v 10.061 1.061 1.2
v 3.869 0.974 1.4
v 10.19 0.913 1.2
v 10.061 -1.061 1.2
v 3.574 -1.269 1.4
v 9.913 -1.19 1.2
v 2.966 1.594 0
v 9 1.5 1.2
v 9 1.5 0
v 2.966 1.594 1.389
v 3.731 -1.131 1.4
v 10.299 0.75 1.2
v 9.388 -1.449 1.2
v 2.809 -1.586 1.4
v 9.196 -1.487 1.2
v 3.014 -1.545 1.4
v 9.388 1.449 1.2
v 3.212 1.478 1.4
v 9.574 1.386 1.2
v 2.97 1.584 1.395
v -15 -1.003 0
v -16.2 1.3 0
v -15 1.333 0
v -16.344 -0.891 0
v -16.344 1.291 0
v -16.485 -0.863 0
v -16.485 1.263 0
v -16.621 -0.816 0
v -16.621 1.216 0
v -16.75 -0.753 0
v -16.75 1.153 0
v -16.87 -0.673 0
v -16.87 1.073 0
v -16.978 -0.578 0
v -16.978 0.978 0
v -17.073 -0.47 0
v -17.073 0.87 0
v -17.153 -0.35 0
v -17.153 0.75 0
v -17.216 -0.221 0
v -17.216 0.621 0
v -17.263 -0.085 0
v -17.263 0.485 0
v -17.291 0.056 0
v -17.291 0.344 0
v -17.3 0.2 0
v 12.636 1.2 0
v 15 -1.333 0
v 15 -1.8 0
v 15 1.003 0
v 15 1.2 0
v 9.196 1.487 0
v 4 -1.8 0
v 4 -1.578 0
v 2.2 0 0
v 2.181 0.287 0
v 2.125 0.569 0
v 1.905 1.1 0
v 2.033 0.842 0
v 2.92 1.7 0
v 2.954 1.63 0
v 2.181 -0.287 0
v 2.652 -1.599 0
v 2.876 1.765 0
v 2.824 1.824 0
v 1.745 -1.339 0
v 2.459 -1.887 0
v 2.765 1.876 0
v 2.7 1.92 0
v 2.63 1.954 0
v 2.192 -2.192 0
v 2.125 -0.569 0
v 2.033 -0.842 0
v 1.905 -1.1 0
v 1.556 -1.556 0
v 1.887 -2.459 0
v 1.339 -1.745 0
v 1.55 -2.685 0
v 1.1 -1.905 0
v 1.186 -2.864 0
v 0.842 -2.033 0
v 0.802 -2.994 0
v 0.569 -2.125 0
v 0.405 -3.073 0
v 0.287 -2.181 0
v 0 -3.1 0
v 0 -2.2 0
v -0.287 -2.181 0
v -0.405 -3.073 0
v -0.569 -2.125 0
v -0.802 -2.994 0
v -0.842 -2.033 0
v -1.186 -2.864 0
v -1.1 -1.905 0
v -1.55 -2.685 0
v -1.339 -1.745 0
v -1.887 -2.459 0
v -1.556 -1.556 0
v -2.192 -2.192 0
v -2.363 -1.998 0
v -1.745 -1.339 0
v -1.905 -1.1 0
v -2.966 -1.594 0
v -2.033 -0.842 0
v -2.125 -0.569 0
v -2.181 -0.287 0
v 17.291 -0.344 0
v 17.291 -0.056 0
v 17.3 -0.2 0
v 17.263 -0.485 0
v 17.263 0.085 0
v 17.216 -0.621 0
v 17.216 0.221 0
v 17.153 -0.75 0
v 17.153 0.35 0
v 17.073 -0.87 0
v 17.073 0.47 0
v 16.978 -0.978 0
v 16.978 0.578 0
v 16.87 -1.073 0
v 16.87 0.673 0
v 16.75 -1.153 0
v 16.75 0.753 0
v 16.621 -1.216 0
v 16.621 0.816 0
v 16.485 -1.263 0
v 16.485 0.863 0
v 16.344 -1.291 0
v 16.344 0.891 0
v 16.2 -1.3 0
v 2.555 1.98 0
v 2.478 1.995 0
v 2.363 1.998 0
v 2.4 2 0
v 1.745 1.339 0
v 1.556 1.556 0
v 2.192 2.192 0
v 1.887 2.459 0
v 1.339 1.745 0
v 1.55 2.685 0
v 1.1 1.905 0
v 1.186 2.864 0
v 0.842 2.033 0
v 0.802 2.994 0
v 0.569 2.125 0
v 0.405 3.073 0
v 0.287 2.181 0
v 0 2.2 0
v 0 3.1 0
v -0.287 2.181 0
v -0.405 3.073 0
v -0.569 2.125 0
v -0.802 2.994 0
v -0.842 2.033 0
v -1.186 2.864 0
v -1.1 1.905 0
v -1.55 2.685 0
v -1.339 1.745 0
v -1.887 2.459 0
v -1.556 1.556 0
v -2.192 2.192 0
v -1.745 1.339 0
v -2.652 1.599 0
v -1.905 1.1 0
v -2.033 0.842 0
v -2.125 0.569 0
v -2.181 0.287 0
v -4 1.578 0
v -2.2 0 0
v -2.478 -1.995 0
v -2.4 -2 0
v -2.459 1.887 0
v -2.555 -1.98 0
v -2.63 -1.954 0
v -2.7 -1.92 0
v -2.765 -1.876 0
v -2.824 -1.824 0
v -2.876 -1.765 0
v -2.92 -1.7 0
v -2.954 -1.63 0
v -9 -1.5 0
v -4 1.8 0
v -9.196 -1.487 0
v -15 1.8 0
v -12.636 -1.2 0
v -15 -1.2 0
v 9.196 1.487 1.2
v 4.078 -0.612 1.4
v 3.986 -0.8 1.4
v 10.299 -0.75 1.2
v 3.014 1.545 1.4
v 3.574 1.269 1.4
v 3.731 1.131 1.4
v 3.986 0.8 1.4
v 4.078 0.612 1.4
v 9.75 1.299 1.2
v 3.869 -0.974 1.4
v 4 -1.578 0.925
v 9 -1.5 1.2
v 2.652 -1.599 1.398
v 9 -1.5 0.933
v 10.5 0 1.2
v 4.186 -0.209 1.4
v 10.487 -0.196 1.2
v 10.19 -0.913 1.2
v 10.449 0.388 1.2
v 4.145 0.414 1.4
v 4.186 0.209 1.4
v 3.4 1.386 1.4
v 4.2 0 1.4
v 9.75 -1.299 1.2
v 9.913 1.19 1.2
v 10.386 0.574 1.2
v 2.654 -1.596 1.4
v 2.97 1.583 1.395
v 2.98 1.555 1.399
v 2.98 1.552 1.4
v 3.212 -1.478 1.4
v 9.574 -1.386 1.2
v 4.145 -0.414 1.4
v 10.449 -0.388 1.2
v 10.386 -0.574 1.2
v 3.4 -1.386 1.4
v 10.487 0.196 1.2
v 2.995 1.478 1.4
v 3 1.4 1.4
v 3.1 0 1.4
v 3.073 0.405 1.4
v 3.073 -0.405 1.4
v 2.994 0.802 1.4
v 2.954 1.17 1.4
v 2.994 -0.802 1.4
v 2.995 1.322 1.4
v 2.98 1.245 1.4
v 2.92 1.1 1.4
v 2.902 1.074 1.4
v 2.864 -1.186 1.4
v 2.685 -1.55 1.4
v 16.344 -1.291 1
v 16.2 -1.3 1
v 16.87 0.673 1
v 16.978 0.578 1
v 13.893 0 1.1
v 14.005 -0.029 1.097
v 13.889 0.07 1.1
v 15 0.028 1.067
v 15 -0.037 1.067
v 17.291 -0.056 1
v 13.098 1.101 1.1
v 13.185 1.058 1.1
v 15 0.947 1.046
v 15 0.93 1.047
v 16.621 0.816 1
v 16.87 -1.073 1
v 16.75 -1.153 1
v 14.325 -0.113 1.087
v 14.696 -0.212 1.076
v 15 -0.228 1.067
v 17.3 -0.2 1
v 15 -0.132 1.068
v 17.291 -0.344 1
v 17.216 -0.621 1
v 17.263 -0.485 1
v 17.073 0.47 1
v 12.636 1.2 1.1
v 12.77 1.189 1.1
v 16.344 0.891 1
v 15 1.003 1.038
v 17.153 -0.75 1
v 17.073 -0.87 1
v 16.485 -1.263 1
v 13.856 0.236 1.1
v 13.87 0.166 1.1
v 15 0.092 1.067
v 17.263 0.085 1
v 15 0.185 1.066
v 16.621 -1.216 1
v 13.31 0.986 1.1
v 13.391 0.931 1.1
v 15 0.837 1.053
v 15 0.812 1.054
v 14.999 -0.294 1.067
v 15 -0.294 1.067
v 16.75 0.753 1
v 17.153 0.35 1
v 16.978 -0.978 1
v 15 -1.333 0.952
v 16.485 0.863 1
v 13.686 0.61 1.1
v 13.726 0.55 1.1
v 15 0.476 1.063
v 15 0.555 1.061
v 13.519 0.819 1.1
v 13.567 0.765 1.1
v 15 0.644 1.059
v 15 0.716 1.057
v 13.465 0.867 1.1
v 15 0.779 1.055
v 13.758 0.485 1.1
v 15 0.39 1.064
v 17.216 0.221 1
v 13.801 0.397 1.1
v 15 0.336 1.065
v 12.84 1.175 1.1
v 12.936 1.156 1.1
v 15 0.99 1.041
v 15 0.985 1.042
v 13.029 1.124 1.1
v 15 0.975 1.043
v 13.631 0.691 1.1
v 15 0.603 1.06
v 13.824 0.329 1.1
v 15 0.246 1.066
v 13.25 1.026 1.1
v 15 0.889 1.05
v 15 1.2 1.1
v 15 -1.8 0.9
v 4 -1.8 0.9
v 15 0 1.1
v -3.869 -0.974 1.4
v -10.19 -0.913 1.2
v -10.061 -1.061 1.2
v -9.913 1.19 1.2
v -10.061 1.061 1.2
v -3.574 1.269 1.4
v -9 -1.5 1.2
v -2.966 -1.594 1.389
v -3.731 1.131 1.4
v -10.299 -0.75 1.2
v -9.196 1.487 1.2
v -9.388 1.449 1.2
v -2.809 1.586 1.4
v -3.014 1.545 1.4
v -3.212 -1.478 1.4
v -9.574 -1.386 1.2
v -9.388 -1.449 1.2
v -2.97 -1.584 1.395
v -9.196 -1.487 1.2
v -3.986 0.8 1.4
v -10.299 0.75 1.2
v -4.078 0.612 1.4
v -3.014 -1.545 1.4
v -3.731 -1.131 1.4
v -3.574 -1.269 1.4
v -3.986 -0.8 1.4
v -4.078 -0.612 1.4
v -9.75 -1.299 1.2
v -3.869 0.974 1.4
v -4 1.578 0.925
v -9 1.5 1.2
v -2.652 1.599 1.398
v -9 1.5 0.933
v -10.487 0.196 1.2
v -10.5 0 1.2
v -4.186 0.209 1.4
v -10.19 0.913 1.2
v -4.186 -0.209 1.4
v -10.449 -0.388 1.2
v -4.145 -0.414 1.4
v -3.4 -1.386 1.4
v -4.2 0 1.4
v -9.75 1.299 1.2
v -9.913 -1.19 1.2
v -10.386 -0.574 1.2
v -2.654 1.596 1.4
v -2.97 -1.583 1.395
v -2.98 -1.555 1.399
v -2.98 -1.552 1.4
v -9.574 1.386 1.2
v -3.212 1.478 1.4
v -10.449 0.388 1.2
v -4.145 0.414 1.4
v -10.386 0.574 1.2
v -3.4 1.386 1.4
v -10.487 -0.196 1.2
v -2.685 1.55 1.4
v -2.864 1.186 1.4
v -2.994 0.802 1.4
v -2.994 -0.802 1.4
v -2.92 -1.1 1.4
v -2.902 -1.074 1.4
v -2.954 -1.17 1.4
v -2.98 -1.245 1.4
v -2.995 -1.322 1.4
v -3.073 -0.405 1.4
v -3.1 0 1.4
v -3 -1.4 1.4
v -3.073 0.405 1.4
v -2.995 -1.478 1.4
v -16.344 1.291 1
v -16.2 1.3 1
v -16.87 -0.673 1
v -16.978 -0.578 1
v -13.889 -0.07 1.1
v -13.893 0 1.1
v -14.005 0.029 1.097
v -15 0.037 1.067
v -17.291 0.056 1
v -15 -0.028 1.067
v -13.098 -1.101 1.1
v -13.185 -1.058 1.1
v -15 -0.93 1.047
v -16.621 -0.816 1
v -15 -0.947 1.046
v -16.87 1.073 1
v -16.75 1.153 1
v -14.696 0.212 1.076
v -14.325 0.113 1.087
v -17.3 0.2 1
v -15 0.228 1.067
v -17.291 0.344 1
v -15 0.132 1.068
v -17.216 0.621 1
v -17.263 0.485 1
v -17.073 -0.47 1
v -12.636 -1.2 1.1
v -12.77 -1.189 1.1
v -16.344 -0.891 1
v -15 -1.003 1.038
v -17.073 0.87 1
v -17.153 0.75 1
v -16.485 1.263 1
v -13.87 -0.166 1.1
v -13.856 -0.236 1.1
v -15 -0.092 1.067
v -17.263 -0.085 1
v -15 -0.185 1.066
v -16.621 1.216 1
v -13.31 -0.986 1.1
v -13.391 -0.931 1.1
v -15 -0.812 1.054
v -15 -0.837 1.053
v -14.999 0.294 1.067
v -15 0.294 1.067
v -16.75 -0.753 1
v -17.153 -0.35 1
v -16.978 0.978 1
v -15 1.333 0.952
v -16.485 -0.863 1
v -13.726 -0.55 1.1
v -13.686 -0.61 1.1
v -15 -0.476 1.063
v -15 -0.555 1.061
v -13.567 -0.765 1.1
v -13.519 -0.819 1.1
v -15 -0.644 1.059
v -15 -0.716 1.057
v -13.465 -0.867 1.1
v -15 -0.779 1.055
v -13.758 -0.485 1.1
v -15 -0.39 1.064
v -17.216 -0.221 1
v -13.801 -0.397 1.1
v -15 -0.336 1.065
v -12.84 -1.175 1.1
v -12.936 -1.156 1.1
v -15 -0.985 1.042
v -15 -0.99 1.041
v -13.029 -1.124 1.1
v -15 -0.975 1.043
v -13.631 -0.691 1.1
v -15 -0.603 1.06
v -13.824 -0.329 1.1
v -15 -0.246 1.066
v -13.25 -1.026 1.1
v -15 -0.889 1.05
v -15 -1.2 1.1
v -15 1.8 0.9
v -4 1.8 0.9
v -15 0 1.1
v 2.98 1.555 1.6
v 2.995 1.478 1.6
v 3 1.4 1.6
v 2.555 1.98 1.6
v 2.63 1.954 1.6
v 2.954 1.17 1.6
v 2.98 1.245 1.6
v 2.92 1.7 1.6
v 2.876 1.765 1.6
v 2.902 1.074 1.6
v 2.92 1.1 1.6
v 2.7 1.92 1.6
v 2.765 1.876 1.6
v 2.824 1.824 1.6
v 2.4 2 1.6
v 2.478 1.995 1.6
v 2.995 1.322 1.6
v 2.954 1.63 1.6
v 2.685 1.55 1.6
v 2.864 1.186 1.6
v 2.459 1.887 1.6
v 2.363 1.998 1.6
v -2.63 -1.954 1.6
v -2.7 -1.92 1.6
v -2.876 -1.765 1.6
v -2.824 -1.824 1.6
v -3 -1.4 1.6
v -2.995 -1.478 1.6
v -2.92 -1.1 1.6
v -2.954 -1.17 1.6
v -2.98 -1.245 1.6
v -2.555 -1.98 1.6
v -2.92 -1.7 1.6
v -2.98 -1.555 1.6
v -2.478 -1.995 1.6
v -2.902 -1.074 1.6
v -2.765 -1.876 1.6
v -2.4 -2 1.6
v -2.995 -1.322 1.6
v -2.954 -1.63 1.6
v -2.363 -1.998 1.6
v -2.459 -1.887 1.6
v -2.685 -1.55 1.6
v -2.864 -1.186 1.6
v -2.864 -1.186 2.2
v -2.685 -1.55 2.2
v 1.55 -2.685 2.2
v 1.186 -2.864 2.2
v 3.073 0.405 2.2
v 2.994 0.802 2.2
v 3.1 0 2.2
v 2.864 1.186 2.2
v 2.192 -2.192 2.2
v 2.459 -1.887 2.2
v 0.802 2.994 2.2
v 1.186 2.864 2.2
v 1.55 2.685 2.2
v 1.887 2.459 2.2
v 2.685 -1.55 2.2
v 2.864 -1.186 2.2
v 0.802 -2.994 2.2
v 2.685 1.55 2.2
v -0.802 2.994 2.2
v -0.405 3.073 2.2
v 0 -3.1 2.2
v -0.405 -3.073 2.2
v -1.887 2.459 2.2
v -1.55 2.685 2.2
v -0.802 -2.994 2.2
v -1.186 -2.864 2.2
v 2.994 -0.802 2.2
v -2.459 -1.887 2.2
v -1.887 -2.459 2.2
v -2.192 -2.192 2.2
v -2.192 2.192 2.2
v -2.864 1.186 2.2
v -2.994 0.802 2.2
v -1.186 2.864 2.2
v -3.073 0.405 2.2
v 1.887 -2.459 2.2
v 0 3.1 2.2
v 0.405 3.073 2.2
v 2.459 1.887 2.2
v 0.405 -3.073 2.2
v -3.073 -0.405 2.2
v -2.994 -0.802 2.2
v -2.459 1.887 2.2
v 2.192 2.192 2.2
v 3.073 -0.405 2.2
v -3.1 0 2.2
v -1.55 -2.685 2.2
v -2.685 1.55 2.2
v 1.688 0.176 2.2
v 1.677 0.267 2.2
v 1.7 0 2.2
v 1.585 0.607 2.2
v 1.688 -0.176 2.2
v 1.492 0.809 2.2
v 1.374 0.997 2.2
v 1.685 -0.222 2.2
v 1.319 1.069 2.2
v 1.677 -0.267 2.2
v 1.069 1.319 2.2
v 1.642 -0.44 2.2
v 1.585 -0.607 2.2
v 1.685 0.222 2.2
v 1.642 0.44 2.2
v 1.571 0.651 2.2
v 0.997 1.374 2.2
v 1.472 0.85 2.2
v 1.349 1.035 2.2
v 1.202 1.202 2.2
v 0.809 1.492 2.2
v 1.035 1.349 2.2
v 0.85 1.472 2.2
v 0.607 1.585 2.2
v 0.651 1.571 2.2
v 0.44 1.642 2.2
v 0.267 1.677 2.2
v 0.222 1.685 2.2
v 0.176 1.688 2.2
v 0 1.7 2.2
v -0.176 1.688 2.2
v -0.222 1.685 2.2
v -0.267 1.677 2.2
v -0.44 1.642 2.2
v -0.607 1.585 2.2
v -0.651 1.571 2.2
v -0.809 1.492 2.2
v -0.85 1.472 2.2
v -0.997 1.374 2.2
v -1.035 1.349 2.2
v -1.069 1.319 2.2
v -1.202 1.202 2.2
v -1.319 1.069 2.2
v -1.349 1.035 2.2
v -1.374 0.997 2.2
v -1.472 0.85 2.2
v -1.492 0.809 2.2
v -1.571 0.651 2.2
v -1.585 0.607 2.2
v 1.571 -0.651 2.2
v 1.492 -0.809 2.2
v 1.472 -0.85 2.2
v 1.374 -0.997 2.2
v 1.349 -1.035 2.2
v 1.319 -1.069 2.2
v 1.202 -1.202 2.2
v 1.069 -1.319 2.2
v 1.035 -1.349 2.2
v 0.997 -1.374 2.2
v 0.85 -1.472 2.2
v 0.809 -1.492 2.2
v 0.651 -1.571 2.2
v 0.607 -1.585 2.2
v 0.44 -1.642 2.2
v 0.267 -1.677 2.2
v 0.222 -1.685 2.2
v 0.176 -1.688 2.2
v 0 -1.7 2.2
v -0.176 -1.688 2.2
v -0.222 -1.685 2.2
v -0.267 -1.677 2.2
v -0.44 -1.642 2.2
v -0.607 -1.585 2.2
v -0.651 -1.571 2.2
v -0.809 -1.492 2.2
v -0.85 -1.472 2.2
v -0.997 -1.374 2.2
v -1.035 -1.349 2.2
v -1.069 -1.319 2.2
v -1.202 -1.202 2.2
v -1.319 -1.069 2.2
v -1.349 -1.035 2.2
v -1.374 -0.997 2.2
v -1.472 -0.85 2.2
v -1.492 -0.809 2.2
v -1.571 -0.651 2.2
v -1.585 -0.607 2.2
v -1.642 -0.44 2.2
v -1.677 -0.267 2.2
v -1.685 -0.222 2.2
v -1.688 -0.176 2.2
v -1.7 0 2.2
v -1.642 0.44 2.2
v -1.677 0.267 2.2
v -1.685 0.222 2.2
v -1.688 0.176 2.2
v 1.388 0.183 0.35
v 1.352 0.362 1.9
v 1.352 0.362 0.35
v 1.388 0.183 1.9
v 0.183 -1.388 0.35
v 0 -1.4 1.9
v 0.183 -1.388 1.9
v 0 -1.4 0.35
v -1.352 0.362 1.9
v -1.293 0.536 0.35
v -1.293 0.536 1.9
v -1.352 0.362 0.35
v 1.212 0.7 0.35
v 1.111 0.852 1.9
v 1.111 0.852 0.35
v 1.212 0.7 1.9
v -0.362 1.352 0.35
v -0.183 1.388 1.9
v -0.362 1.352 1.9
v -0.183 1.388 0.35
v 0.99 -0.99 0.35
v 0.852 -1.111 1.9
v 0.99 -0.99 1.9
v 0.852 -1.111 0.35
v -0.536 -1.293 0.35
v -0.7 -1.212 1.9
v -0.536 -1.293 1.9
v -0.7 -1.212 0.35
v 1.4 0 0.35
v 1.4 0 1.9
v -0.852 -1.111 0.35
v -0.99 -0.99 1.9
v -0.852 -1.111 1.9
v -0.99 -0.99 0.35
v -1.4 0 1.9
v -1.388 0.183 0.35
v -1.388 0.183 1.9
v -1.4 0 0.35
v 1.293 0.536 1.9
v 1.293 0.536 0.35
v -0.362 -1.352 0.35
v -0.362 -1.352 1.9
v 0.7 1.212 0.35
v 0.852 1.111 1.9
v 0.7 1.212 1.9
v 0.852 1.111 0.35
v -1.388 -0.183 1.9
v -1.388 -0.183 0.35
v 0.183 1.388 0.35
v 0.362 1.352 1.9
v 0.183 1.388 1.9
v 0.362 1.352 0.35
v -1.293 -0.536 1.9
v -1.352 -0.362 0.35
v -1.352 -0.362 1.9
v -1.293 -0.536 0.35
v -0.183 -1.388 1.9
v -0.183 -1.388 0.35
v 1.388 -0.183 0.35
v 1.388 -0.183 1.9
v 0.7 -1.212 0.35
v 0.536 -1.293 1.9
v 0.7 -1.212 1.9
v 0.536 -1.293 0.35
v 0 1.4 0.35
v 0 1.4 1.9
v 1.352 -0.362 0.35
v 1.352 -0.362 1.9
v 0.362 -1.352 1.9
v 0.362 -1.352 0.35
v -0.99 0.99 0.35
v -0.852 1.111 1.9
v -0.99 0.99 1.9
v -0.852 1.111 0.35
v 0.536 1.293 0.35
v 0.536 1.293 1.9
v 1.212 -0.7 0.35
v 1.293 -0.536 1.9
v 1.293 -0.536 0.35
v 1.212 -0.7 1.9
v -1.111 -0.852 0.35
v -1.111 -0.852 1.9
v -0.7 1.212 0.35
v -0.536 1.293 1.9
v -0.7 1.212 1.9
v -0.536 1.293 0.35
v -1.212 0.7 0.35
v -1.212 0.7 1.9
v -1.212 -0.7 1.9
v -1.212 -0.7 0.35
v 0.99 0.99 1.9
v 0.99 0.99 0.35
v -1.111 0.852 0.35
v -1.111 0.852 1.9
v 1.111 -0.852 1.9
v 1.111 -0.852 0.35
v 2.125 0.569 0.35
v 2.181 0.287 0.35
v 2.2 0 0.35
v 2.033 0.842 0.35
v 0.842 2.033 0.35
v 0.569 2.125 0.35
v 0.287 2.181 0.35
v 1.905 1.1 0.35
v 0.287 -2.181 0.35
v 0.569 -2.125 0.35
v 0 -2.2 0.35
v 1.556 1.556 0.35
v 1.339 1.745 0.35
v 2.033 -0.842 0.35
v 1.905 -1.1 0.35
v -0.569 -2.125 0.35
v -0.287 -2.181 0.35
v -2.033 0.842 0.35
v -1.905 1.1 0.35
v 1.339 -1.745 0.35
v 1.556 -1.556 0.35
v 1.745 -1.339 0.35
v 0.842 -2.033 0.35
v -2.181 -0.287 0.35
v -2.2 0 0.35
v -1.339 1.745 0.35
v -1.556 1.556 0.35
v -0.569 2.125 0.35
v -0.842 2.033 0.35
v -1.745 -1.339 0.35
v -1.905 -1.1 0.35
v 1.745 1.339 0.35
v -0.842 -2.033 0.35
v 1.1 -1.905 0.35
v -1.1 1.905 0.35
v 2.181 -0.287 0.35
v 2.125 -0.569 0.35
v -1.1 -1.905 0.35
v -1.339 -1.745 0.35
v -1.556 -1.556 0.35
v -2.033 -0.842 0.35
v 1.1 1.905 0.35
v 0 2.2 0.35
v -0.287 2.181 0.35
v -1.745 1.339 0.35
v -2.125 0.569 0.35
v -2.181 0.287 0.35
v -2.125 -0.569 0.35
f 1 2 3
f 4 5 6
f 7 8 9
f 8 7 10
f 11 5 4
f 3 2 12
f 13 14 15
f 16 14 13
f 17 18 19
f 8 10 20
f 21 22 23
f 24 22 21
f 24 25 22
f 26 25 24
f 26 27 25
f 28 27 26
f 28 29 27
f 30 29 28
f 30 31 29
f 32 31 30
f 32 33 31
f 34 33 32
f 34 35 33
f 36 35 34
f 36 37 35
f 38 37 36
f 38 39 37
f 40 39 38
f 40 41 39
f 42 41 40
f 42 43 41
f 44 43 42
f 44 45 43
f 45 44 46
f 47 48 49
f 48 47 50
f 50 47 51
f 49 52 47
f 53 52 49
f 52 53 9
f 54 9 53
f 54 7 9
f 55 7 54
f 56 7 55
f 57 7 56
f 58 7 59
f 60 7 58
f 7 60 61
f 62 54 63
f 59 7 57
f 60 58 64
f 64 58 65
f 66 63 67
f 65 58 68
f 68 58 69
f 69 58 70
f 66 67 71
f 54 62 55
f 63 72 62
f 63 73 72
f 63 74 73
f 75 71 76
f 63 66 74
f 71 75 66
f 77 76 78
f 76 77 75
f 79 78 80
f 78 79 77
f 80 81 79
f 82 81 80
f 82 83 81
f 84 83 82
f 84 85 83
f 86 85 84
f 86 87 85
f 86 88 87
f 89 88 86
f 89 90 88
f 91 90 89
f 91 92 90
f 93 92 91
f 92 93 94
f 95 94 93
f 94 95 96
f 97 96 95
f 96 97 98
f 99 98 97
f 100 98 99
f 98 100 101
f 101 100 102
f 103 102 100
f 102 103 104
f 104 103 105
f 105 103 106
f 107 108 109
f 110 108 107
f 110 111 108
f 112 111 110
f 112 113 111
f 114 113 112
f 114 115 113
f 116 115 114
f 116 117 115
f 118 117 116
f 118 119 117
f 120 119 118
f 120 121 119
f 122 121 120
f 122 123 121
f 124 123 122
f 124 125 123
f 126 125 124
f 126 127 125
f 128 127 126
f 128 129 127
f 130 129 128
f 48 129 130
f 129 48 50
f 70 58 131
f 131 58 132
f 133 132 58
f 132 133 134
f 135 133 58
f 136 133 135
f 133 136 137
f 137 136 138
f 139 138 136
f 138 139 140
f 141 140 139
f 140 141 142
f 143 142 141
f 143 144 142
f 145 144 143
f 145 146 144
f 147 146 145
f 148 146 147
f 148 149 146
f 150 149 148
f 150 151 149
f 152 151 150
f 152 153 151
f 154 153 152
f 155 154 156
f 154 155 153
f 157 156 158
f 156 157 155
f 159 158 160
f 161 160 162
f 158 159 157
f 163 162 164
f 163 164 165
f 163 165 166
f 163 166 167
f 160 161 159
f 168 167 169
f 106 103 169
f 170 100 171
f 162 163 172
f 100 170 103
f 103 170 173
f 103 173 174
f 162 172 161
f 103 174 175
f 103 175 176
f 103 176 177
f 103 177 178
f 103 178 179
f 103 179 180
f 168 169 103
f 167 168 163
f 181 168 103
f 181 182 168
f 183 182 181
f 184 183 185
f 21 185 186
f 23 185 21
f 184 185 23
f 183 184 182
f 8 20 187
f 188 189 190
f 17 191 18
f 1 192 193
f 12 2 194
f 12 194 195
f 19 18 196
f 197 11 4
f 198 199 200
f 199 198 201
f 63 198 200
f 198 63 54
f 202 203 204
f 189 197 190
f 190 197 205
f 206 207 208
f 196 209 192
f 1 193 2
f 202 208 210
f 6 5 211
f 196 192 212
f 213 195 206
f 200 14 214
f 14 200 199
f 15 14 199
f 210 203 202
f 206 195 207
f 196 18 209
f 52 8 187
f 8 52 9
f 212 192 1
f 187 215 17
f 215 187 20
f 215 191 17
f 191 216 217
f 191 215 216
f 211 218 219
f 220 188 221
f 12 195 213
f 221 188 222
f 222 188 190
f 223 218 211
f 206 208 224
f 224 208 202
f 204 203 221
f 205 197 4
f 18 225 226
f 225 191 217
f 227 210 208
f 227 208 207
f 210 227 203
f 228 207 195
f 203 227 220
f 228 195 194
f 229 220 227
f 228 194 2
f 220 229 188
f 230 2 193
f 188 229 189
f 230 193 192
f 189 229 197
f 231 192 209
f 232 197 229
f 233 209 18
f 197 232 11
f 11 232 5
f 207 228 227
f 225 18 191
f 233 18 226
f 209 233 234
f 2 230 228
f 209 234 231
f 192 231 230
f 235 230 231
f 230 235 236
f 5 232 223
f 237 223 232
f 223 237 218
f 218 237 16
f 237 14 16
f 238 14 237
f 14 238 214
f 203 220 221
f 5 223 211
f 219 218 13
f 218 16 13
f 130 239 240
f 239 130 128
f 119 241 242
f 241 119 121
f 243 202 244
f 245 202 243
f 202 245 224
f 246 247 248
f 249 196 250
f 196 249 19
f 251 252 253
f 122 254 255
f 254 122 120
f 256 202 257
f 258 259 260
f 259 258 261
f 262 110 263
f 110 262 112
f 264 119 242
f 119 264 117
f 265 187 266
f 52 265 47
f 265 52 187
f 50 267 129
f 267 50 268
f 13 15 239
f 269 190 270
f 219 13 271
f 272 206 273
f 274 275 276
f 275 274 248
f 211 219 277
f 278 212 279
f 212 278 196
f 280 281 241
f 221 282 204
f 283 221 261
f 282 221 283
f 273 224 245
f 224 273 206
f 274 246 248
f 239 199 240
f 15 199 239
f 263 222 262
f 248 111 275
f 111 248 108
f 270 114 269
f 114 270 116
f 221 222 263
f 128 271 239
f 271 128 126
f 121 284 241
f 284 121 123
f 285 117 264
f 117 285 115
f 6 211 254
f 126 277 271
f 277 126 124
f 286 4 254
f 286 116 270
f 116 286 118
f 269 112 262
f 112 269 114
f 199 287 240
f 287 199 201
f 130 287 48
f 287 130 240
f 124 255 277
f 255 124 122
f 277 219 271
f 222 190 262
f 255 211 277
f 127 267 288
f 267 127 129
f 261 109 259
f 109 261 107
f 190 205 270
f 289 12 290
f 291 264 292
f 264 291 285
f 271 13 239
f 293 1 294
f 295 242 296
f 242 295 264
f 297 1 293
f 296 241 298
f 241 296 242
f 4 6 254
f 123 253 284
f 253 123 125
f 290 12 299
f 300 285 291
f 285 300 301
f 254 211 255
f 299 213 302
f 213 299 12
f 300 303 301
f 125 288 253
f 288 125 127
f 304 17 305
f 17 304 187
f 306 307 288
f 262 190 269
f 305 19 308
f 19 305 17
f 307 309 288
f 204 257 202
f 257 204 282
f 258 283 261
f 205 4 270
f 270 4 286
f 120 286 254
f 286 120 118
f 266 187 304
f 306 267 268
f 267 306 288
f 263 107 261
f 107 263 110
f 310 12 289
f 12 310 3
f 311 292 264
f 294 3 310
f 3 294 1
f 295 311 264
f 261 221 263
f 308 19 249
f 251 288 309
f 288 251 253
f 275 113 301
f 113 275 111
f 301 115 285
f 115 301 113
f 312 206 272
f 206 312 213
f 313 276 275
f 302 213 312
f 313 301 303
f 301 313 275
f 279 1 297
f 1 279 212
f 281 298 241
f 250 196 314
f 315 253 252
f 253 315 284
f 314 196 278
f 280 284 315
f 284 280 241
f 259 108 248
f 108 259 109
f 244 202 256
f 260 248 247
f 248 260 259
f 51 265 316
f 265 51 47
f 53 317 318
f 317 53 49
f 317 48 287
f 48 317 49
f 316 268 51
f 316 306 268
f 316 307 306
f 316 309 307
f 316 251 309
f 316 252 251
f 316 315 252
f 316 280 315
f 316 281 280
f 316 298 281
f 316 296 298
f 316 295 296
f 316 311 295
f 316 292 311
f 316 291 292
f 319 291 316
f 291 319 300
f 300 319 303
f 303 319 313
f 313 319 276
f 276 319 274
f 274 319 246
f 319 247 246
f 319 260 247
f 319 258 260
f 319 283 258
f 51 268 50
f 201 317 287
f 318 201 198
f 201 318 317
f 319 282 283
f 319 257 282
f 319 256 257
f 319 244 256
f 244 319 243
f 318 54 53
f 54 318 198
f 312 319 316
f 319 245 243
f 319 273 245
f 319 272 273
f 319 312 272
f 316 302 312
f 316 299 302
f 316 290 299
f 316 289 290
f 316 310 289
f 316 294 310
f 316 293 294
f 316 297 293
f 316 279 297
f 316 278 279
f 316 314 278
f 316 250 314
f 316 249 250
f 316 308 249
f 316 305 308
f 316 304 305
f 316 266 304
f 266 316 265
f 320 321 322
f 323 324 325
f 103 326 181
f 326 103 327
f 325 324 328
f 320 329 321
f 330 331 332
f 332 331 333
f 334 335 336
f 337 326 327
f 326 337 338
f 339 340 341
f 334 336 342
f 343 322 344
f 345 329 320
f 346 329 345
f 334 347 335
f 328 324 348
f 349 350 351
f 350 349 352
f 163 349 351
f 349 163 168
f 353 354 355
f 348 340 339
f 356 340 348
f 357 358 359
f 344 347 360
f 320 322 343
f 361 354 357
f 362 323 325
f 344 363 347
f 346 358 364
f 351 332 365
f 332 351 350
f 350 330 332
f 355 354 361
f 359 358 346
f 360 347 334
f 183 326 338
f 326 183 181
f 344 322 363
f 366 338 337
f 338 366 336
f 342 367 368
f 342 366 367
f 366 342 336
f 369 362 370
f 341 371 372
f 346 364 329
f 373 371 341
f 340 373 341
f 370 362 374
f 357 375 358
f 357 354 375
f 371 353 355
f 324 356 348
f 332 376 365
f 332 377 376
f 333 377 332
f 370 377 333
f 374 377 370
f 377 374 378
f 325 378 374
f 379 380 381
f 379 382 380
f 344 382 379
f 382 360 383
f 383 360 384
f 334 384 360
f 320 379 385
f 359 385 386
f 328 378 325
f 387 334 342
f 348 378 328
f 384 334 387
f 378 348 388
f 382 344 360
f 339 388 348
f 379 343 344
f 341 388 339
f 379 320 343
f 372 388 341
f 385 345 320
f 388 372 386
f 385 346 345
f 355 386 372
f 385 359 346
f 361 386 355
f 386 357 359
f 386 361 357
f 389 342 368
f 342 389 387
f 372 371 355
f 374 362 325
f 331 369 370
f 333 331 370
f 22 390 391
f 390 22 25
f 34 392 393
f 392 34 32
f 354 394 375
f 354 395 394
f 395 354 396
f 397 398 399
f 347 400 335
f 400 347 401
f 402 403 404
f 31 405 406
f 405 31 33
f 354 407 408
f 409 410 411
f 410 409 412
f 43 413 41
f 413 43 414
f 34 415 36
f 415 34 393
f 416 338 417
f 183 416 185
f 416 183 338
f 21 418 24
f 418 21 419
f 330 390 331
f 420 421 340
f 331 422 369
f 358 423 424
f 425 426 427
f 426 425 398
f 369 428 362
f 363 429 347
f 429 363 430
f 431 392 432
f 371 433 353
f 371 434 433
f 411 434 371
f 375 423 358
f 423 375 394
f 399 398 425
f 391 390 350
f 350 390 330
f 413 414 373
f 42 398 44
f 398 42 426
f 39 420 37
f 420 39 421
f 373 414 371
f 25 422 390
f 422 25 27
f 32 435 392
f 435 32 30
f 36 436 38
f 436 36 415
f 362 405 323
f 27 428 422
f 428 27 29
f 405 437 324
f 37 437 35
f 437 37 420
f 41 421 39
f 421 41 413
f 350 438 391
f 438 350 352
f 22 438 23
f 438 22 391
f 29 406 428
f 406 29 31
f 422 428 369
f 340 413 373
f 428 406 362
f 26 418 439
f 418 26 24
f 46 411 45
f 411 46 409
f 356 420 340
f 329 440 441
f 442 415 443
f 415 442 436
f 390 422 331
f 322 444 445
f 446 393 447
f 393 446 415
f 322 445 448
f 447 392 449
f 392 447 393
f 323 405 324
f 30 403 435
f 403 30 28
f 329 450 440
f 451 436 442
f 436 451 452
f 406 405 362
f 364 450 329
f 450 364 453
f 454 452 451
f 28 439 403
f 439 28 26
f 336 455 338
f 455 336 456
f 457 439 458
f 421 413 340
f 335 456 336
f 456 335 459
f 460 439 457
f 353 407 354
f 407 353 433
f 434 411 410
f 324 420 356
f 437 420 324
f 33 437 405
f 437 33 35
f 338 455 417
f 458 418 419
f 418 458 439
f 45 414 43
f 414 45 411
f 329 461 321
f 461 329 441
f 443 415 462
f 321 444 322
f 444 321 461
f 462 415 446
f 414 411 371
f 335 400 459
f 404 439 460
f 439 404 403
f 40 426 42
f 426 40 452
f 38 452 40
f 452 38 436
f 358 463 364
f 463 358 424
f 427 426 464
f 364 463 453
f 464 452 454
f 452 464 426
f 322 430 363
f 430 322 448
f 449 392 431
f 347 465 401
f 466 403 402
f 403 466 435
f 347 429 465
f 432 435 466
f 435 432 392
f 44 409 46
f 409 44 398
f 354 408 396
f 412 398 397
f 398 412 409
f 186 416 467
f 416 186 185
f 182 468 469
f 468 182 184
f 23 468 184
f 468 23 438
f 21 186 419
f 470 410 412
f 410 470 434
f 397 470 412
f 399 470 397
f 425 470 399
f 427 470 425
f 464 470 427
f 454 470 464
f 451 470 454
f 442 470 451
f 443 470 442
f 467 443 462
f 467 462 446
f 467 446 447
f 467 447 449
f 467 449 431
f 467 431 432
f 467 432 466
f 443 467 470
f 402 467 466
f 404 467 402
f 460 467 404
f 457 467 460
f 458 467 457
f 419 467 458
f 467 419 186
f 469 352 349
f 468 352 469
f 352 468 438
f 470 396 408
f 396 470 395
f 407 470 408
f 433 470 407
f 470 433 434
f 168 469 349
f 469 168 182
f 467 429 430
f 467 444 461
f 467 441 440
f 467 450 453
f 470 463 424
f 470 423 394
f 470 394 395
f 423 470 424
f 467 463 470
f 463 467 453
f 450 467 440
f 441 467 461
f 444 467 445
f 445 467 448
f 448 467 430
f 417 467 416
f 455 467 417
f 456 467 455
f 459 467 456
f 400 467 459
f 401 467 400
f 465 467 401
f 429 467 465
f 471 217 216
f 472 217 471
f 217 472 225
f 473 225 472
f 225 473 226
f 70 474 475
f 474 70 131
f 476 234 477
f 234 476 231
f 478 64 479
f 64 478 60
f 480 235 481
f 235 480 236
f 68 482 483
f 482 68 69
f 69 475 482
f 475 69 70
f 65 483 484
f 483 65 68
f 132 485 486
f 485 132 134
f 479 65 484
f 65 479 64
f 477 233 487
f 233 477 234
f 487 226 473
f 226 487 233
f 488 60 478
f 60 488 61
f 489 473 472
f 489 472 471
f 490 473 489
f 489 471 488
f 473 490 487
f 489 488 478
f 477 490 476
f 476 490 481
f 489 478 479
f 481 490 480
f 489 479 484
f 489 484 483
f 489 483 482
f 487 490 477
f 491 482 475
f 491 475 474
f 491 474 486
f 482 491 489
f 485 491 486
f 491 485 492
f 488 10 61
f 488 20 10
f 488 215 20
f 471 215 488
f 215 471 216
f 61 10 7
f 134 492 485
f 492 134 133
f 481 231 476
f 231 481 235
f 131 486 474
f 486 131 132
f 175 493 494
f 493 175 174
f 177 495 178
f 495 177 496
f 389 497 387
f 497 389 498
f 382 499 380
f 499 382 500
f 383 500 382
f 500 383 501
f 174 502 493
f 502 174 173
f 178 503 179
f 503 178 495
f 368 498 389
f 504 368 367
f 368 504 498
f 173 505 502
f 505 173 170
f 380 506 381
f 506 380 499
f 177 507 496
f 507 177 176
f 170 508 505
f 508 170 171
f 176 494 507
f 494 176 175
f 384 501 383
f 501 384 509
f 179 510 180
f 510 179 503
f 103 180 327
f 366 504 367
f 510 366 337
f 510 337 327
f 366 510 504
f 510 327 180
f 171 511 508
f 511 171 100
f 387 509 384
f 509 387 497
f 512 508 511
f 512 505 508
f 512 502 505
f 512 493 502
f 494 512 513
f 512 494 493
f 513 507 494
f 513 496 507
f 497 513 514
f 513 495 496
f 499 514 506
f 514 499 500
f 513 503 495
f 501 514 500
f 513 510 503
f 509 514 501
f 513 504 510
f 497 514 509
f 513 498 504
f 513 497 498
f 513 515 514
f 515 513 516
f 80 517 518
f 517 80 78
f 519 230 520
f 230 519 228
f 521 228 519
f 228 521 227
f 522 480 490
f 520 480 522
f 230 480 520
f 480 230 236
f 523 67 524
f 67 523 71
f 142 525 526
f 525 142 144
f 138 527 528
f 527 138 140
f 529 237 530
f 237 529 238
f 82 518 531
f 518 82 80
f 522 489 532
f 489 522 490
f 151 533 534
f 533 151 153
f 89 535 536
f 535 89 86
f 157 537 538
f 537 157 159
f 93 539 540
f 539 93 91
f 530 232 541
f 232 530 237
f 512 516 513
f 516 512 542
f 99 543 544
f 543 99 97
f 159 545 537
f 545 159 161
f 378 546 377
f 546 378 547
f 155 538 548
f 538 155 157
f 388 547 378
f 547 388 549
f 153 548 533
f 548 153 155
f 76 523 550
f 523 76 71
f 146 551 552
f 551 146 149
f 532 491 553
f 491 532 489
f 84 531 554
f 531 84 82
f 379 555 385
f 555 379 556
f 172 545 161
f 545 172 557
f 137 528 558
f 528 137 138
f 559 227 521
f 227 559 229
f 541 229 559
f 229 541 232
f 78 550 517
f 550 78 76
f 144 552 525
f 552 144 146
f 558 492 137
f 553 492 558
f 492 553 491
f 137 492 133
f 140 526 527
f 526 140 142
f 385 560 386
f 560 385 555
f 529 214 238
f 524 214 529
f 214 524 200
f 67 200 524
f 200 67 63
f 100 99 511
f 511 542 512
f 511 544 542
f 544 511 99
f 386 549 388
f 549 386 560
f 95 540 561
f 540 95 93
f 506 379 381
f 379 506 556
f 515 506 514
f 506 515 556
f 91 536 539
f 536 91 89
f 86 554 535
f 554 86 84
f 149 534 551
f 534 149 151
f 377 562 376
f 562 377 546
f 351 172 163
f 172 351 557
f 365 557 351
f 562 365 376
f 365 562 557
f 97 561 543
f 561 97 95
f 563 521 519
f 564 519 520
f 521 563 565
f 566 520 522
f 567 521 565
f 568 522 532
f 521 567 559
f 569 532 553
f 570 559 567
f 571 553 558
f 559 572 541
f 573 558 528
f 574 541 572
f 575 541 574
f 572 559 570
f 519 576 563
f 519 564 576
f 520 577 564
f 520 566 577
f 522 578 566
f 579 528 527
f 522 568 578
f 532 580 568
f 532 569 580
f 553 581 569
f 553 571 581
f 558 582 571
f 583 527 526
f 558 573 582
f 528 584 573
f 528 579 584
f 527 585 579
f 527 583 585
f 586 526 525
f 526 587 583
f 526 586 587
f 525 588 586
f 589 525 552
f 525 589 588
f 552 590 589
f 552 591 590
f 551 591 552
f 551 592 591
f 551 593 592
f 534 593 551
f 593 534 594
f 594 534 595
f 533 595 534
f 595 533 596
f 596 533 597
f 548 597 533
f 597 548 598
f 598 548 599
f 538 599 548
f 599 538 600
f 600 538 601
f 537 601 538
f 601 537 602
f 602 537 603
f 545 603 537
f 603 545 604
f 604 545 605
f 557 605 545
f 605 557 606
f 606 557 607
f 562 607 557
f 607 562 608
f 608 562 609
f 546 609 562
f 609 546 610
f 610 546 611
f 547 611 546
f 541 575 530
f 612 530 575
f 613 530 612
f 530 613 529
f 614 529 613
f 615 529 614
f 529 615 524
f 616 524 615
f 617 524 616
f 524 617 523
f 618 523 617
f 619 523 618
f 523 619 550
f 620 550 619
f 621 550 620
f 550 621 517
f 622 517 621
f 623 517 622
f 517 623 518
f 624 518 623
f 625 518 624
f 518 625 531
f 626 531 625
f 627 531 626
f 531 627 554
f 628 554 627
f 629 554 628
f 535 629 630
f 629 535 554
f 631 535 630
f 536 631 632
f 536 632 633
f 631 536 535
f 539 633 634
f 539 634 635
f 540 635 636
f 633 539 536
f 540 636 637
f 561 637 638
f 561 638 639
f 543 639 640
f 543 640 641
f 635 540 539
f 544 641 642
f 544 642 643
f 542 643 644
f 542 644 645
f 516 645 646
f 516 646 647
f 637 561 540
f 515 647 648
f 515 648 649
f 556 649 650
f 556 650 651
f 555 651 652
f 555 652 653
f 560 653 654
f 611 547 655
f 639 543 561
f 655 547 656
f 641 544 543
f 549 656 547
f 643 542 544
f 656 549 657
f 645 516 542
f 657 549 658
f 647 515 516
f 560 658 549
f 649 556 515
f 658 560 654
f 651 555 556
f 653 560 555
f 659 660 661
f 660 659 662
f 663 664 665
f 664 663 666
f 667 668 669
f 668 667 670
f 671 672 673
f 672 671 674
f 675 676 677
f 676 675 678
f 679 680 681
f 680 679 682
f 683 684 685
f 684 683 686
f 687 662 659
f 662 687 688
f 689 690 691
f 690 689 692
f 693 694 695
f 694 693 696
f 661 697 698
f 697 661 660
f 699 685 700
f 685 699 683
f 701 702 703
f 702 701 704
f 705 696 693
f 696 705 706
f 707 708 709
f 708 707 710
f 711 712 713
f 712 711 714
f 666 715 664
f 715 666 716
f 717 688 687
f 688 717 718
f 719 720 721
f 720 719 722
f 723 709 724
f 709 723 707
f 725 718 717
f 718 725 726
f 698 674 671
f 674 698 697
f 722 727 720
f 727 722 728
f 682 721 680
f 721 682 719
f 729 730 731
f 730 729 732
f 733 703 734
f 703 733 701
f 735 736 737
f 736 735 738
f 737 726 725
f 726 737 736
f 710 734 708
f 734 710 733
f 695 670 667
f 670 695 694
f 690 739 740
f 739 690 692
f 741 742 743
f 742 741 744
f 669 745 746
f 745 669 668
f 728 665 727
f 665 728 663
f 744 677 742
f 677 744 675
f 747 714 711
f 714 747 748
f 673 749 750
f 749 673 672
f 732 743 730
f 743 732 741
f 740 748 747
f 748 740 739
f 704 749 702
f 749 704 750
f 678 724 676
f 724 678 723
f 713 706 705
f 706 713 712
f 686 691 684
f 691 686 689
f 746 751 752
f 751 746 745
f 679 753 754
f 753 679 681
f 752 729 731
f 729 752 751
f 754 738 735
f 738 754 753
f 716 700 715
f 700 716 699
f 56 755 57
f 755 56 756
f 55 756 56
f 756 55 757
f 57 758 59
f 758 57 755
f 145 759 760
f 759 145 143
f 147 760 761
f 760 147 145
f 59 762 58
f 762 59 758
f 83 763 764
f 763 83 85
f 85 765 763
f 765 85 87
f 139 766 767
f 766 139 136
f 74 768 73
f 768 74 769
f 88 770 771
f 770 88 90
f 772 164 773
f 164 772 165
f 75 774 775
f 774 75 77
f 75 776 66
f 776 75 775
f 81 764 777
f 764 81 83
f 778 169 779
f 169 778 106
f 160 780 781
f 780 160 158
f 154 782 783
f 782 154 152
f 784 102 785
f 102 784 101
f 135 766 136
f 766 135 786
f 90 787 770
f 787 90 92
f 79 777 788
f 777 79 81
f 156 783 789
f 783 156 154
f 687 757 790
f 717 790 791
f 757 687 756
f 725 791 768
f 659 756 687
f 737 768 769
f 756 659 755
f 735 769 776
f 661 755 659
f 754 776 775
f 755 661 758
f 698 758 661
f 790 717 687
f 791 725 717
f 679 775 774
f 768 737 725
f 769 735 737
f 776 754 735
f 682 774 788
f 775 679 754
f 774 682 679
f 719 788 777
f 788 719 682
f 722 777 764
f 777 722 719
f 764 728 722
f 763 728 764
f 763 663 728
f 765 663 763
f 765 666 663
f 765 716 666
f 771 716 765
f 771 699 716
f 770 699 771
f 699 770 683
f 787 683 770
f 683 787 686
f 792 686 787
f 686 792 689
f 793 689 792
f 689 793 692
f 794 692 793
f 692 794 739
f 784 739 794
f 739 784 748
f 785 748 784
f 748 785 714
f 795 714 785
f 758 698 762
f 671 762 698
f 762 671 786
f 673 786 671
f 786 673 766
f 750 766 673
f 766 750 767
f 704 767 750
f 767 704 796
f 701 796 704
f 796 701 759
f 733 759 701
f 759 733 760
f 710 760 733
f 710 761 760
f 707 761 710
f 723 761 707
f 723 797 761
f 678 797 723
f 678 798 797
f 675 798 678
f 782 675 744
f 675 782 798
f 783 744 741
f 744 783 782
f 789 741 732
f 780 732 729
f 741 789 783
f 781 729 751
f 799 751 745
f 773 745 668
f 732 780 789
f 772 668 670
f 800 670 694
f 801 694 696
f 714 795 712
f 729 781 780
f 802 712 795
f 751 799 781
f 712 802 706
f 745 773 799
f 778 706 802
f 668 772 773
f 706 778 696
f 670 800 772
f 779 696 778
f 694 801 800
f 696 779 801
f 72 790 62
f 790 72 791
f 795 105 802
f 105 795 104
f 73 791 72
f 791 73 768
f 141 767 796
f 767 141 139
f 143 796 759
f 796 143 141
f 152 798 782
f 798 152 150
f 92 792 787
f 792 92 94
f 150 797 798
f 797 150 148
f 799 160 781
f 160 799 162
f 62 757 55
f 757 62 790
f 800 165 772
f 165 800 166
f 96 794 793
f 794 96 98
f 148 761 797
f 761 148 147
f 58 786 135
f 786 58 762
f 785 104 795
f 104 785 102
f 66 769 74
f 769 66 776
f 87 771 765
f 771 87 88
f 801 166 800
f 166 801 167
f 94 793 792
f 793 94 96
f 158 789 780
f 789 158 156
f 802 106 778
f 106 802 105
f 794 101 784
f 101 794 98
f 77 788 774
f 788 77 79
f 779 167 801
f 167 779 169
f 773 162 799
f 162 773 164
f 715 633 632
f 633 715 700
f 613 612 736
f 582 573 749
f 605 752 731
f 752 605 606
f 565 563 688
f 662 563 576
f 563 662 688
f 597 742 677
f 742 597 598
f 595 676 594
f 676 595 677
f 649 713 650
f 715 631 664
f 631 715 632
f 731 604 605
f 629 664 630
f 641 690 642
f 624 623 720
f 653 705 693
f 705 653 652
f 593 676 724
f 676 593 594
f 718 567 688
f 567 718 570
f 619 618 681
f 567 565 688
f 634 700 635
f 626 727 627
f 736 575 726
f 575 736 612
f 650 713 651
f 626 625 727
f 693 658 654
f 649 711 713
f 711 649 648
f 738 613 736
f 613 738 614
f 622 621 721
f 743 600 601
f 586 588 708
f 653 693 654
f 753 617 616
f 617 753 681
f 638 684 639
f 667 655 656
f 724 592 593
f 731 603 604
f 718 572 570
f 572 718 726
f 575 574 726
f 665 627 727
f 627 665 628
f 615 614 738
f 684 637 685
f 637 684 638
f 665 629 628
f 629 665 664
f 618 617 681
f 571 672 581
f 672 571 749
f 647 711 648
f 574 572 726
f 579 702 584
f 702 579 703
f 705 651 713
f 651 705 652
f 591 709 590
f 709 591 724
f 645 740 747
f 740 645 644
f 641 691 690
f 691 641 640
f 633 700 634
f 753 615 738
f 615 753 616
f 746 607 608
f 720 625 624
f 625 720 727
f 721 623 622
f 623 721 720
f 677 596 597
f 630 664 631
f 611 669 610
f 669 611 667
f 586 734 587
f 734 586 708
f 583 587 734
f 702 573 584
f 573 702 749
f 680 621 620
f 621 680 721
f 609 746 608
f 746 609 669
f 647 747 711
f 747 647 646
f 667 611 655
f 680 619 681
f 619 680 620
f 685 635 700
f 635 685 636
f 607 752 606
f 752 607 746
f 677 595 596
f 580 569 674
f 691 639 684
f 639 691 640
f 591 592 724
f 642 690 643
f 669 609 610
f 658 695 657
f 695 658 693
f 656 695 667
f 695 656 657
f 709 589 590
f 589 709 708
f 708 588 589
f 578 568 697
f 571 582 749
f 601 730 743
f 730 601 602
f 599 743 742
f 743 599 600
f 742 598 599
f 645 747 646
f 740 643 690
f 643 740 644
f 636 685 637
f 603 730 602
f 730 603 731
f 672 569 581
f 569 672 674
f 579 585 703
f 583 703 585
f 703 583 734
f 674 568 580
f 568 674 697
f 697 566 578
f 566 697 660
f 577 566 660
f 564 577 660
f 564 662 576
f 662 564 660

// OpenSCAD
// ====================================================================
// Modular Rotatable Chopper Rotor (34mm Swept Diameter)
// Fits within standard 35mm x 35mm (3.5 cm) square bounding box.
//
// Engineering Specifications:
// - Swept Diameter: 34.0 mm (Radius: 17.0 mm)
// - Hub Diameter: 6.2 mm, Hub Height: 2.2 mm
// - Axle Bore: 2.8 mm through-hole (for 2.4 mm pin -> 0.4mm clearance)
// - Low-friction underside relief pocket (reduces bearing drag)
// - Aerodynamic blade profile with reinforced root cuffs
// - 100% supportless flat print at Z = 0
// - Configurable blade count (2-blade standard or 3-blade heavy lift)
// ====================================================================

$fn = 48;

blade_count = 2; // 2 for high-speed scout, 3 for heavy-lift

module rotor_blade(r = 17.0) {
    hull() {
        // Root cuff near hub
        translate([2.6, 0, 0])
            cylinder(r = 1.6, h = 1.4, center = false);
        // Mid span
        translate([9.0, 0, 0])
            cylinder(r = 1.5, h = 1.2, center = false);
    }
    hull() {
        // Mid span
        translate([9.0, 0, 0])
            cylinder(r = 1.5, h = 1.2, center = false);
        // Blade tip (swept taper)
        translate([r - 0.8, -0.2, 0])
            cylinder(r = 1.1, h = 1.0, center = false);
    }
    // Trailing edge airfoil taper
    hull() {
        translate([4.0, -1.8, 0])
            cube([r - 6.0, 0.4, 0.9]);
        translate([4.0, 0, 0])
            cube([r - 6.0, 1.2, 1.1]);
    }
}

module rotatable_rotor(blades = 2, bore_d = 2.8) {
    hub_r = 3.1;
    hub_h = 2.2;
    angle_step = 360 / blades;

    difference() {
        union() {
            // Central Hub
            cylinder(r = hub_r, h = hub_h, center = false);

            // Hub top bevel ring
            translate([0, 0, hub_h - 0.4])
                cylinder(r1 = hub_r, r2 = hub_r - 0.4, h = 0.4, center = false);

            // Blades
            for (i = [0 : blades - 1]) {
                rotate([0, 0, i * angle_step])
                    rotor_blade(17.0);
            }

            // Pitch control hinge details
            for (i = [0 : blades - 1]) {
                rotate([0, 0, i * angle_step])
                    translate([2.4, 1.4, 0])
                        cylinder(r = 0.6, h = 1.6, center = false);
            }
        }

        // Center axle bore for rotatable pin (clearance gap for smooth spinning)
        translate([0, 0, -0.1])
            cylinder(d = bore_d, h = hub_h + 0.2, center = false);

        // Underside low-friction bearing recess
        // Relieves inner surface so only outer rim contacts the mast collar
        translate([0, 0, -0.05])
            cylinder(d = 4.4, h = 0.4, center = false);

        // Top chamfer on bore for easy pin insertion
        translate([0, 0, hub_h - 0.3])
            cylinder(r1 = bore_d/2, r2 = bore_d/2 + 0.4, h = 0.4, center = false);
    }
}

// Default standalone render (2-blade rotor flat on print bed)
translate([0, 0, 0])
    rotatable_rotor(blades = blade_count, bore_d = 2.8);
